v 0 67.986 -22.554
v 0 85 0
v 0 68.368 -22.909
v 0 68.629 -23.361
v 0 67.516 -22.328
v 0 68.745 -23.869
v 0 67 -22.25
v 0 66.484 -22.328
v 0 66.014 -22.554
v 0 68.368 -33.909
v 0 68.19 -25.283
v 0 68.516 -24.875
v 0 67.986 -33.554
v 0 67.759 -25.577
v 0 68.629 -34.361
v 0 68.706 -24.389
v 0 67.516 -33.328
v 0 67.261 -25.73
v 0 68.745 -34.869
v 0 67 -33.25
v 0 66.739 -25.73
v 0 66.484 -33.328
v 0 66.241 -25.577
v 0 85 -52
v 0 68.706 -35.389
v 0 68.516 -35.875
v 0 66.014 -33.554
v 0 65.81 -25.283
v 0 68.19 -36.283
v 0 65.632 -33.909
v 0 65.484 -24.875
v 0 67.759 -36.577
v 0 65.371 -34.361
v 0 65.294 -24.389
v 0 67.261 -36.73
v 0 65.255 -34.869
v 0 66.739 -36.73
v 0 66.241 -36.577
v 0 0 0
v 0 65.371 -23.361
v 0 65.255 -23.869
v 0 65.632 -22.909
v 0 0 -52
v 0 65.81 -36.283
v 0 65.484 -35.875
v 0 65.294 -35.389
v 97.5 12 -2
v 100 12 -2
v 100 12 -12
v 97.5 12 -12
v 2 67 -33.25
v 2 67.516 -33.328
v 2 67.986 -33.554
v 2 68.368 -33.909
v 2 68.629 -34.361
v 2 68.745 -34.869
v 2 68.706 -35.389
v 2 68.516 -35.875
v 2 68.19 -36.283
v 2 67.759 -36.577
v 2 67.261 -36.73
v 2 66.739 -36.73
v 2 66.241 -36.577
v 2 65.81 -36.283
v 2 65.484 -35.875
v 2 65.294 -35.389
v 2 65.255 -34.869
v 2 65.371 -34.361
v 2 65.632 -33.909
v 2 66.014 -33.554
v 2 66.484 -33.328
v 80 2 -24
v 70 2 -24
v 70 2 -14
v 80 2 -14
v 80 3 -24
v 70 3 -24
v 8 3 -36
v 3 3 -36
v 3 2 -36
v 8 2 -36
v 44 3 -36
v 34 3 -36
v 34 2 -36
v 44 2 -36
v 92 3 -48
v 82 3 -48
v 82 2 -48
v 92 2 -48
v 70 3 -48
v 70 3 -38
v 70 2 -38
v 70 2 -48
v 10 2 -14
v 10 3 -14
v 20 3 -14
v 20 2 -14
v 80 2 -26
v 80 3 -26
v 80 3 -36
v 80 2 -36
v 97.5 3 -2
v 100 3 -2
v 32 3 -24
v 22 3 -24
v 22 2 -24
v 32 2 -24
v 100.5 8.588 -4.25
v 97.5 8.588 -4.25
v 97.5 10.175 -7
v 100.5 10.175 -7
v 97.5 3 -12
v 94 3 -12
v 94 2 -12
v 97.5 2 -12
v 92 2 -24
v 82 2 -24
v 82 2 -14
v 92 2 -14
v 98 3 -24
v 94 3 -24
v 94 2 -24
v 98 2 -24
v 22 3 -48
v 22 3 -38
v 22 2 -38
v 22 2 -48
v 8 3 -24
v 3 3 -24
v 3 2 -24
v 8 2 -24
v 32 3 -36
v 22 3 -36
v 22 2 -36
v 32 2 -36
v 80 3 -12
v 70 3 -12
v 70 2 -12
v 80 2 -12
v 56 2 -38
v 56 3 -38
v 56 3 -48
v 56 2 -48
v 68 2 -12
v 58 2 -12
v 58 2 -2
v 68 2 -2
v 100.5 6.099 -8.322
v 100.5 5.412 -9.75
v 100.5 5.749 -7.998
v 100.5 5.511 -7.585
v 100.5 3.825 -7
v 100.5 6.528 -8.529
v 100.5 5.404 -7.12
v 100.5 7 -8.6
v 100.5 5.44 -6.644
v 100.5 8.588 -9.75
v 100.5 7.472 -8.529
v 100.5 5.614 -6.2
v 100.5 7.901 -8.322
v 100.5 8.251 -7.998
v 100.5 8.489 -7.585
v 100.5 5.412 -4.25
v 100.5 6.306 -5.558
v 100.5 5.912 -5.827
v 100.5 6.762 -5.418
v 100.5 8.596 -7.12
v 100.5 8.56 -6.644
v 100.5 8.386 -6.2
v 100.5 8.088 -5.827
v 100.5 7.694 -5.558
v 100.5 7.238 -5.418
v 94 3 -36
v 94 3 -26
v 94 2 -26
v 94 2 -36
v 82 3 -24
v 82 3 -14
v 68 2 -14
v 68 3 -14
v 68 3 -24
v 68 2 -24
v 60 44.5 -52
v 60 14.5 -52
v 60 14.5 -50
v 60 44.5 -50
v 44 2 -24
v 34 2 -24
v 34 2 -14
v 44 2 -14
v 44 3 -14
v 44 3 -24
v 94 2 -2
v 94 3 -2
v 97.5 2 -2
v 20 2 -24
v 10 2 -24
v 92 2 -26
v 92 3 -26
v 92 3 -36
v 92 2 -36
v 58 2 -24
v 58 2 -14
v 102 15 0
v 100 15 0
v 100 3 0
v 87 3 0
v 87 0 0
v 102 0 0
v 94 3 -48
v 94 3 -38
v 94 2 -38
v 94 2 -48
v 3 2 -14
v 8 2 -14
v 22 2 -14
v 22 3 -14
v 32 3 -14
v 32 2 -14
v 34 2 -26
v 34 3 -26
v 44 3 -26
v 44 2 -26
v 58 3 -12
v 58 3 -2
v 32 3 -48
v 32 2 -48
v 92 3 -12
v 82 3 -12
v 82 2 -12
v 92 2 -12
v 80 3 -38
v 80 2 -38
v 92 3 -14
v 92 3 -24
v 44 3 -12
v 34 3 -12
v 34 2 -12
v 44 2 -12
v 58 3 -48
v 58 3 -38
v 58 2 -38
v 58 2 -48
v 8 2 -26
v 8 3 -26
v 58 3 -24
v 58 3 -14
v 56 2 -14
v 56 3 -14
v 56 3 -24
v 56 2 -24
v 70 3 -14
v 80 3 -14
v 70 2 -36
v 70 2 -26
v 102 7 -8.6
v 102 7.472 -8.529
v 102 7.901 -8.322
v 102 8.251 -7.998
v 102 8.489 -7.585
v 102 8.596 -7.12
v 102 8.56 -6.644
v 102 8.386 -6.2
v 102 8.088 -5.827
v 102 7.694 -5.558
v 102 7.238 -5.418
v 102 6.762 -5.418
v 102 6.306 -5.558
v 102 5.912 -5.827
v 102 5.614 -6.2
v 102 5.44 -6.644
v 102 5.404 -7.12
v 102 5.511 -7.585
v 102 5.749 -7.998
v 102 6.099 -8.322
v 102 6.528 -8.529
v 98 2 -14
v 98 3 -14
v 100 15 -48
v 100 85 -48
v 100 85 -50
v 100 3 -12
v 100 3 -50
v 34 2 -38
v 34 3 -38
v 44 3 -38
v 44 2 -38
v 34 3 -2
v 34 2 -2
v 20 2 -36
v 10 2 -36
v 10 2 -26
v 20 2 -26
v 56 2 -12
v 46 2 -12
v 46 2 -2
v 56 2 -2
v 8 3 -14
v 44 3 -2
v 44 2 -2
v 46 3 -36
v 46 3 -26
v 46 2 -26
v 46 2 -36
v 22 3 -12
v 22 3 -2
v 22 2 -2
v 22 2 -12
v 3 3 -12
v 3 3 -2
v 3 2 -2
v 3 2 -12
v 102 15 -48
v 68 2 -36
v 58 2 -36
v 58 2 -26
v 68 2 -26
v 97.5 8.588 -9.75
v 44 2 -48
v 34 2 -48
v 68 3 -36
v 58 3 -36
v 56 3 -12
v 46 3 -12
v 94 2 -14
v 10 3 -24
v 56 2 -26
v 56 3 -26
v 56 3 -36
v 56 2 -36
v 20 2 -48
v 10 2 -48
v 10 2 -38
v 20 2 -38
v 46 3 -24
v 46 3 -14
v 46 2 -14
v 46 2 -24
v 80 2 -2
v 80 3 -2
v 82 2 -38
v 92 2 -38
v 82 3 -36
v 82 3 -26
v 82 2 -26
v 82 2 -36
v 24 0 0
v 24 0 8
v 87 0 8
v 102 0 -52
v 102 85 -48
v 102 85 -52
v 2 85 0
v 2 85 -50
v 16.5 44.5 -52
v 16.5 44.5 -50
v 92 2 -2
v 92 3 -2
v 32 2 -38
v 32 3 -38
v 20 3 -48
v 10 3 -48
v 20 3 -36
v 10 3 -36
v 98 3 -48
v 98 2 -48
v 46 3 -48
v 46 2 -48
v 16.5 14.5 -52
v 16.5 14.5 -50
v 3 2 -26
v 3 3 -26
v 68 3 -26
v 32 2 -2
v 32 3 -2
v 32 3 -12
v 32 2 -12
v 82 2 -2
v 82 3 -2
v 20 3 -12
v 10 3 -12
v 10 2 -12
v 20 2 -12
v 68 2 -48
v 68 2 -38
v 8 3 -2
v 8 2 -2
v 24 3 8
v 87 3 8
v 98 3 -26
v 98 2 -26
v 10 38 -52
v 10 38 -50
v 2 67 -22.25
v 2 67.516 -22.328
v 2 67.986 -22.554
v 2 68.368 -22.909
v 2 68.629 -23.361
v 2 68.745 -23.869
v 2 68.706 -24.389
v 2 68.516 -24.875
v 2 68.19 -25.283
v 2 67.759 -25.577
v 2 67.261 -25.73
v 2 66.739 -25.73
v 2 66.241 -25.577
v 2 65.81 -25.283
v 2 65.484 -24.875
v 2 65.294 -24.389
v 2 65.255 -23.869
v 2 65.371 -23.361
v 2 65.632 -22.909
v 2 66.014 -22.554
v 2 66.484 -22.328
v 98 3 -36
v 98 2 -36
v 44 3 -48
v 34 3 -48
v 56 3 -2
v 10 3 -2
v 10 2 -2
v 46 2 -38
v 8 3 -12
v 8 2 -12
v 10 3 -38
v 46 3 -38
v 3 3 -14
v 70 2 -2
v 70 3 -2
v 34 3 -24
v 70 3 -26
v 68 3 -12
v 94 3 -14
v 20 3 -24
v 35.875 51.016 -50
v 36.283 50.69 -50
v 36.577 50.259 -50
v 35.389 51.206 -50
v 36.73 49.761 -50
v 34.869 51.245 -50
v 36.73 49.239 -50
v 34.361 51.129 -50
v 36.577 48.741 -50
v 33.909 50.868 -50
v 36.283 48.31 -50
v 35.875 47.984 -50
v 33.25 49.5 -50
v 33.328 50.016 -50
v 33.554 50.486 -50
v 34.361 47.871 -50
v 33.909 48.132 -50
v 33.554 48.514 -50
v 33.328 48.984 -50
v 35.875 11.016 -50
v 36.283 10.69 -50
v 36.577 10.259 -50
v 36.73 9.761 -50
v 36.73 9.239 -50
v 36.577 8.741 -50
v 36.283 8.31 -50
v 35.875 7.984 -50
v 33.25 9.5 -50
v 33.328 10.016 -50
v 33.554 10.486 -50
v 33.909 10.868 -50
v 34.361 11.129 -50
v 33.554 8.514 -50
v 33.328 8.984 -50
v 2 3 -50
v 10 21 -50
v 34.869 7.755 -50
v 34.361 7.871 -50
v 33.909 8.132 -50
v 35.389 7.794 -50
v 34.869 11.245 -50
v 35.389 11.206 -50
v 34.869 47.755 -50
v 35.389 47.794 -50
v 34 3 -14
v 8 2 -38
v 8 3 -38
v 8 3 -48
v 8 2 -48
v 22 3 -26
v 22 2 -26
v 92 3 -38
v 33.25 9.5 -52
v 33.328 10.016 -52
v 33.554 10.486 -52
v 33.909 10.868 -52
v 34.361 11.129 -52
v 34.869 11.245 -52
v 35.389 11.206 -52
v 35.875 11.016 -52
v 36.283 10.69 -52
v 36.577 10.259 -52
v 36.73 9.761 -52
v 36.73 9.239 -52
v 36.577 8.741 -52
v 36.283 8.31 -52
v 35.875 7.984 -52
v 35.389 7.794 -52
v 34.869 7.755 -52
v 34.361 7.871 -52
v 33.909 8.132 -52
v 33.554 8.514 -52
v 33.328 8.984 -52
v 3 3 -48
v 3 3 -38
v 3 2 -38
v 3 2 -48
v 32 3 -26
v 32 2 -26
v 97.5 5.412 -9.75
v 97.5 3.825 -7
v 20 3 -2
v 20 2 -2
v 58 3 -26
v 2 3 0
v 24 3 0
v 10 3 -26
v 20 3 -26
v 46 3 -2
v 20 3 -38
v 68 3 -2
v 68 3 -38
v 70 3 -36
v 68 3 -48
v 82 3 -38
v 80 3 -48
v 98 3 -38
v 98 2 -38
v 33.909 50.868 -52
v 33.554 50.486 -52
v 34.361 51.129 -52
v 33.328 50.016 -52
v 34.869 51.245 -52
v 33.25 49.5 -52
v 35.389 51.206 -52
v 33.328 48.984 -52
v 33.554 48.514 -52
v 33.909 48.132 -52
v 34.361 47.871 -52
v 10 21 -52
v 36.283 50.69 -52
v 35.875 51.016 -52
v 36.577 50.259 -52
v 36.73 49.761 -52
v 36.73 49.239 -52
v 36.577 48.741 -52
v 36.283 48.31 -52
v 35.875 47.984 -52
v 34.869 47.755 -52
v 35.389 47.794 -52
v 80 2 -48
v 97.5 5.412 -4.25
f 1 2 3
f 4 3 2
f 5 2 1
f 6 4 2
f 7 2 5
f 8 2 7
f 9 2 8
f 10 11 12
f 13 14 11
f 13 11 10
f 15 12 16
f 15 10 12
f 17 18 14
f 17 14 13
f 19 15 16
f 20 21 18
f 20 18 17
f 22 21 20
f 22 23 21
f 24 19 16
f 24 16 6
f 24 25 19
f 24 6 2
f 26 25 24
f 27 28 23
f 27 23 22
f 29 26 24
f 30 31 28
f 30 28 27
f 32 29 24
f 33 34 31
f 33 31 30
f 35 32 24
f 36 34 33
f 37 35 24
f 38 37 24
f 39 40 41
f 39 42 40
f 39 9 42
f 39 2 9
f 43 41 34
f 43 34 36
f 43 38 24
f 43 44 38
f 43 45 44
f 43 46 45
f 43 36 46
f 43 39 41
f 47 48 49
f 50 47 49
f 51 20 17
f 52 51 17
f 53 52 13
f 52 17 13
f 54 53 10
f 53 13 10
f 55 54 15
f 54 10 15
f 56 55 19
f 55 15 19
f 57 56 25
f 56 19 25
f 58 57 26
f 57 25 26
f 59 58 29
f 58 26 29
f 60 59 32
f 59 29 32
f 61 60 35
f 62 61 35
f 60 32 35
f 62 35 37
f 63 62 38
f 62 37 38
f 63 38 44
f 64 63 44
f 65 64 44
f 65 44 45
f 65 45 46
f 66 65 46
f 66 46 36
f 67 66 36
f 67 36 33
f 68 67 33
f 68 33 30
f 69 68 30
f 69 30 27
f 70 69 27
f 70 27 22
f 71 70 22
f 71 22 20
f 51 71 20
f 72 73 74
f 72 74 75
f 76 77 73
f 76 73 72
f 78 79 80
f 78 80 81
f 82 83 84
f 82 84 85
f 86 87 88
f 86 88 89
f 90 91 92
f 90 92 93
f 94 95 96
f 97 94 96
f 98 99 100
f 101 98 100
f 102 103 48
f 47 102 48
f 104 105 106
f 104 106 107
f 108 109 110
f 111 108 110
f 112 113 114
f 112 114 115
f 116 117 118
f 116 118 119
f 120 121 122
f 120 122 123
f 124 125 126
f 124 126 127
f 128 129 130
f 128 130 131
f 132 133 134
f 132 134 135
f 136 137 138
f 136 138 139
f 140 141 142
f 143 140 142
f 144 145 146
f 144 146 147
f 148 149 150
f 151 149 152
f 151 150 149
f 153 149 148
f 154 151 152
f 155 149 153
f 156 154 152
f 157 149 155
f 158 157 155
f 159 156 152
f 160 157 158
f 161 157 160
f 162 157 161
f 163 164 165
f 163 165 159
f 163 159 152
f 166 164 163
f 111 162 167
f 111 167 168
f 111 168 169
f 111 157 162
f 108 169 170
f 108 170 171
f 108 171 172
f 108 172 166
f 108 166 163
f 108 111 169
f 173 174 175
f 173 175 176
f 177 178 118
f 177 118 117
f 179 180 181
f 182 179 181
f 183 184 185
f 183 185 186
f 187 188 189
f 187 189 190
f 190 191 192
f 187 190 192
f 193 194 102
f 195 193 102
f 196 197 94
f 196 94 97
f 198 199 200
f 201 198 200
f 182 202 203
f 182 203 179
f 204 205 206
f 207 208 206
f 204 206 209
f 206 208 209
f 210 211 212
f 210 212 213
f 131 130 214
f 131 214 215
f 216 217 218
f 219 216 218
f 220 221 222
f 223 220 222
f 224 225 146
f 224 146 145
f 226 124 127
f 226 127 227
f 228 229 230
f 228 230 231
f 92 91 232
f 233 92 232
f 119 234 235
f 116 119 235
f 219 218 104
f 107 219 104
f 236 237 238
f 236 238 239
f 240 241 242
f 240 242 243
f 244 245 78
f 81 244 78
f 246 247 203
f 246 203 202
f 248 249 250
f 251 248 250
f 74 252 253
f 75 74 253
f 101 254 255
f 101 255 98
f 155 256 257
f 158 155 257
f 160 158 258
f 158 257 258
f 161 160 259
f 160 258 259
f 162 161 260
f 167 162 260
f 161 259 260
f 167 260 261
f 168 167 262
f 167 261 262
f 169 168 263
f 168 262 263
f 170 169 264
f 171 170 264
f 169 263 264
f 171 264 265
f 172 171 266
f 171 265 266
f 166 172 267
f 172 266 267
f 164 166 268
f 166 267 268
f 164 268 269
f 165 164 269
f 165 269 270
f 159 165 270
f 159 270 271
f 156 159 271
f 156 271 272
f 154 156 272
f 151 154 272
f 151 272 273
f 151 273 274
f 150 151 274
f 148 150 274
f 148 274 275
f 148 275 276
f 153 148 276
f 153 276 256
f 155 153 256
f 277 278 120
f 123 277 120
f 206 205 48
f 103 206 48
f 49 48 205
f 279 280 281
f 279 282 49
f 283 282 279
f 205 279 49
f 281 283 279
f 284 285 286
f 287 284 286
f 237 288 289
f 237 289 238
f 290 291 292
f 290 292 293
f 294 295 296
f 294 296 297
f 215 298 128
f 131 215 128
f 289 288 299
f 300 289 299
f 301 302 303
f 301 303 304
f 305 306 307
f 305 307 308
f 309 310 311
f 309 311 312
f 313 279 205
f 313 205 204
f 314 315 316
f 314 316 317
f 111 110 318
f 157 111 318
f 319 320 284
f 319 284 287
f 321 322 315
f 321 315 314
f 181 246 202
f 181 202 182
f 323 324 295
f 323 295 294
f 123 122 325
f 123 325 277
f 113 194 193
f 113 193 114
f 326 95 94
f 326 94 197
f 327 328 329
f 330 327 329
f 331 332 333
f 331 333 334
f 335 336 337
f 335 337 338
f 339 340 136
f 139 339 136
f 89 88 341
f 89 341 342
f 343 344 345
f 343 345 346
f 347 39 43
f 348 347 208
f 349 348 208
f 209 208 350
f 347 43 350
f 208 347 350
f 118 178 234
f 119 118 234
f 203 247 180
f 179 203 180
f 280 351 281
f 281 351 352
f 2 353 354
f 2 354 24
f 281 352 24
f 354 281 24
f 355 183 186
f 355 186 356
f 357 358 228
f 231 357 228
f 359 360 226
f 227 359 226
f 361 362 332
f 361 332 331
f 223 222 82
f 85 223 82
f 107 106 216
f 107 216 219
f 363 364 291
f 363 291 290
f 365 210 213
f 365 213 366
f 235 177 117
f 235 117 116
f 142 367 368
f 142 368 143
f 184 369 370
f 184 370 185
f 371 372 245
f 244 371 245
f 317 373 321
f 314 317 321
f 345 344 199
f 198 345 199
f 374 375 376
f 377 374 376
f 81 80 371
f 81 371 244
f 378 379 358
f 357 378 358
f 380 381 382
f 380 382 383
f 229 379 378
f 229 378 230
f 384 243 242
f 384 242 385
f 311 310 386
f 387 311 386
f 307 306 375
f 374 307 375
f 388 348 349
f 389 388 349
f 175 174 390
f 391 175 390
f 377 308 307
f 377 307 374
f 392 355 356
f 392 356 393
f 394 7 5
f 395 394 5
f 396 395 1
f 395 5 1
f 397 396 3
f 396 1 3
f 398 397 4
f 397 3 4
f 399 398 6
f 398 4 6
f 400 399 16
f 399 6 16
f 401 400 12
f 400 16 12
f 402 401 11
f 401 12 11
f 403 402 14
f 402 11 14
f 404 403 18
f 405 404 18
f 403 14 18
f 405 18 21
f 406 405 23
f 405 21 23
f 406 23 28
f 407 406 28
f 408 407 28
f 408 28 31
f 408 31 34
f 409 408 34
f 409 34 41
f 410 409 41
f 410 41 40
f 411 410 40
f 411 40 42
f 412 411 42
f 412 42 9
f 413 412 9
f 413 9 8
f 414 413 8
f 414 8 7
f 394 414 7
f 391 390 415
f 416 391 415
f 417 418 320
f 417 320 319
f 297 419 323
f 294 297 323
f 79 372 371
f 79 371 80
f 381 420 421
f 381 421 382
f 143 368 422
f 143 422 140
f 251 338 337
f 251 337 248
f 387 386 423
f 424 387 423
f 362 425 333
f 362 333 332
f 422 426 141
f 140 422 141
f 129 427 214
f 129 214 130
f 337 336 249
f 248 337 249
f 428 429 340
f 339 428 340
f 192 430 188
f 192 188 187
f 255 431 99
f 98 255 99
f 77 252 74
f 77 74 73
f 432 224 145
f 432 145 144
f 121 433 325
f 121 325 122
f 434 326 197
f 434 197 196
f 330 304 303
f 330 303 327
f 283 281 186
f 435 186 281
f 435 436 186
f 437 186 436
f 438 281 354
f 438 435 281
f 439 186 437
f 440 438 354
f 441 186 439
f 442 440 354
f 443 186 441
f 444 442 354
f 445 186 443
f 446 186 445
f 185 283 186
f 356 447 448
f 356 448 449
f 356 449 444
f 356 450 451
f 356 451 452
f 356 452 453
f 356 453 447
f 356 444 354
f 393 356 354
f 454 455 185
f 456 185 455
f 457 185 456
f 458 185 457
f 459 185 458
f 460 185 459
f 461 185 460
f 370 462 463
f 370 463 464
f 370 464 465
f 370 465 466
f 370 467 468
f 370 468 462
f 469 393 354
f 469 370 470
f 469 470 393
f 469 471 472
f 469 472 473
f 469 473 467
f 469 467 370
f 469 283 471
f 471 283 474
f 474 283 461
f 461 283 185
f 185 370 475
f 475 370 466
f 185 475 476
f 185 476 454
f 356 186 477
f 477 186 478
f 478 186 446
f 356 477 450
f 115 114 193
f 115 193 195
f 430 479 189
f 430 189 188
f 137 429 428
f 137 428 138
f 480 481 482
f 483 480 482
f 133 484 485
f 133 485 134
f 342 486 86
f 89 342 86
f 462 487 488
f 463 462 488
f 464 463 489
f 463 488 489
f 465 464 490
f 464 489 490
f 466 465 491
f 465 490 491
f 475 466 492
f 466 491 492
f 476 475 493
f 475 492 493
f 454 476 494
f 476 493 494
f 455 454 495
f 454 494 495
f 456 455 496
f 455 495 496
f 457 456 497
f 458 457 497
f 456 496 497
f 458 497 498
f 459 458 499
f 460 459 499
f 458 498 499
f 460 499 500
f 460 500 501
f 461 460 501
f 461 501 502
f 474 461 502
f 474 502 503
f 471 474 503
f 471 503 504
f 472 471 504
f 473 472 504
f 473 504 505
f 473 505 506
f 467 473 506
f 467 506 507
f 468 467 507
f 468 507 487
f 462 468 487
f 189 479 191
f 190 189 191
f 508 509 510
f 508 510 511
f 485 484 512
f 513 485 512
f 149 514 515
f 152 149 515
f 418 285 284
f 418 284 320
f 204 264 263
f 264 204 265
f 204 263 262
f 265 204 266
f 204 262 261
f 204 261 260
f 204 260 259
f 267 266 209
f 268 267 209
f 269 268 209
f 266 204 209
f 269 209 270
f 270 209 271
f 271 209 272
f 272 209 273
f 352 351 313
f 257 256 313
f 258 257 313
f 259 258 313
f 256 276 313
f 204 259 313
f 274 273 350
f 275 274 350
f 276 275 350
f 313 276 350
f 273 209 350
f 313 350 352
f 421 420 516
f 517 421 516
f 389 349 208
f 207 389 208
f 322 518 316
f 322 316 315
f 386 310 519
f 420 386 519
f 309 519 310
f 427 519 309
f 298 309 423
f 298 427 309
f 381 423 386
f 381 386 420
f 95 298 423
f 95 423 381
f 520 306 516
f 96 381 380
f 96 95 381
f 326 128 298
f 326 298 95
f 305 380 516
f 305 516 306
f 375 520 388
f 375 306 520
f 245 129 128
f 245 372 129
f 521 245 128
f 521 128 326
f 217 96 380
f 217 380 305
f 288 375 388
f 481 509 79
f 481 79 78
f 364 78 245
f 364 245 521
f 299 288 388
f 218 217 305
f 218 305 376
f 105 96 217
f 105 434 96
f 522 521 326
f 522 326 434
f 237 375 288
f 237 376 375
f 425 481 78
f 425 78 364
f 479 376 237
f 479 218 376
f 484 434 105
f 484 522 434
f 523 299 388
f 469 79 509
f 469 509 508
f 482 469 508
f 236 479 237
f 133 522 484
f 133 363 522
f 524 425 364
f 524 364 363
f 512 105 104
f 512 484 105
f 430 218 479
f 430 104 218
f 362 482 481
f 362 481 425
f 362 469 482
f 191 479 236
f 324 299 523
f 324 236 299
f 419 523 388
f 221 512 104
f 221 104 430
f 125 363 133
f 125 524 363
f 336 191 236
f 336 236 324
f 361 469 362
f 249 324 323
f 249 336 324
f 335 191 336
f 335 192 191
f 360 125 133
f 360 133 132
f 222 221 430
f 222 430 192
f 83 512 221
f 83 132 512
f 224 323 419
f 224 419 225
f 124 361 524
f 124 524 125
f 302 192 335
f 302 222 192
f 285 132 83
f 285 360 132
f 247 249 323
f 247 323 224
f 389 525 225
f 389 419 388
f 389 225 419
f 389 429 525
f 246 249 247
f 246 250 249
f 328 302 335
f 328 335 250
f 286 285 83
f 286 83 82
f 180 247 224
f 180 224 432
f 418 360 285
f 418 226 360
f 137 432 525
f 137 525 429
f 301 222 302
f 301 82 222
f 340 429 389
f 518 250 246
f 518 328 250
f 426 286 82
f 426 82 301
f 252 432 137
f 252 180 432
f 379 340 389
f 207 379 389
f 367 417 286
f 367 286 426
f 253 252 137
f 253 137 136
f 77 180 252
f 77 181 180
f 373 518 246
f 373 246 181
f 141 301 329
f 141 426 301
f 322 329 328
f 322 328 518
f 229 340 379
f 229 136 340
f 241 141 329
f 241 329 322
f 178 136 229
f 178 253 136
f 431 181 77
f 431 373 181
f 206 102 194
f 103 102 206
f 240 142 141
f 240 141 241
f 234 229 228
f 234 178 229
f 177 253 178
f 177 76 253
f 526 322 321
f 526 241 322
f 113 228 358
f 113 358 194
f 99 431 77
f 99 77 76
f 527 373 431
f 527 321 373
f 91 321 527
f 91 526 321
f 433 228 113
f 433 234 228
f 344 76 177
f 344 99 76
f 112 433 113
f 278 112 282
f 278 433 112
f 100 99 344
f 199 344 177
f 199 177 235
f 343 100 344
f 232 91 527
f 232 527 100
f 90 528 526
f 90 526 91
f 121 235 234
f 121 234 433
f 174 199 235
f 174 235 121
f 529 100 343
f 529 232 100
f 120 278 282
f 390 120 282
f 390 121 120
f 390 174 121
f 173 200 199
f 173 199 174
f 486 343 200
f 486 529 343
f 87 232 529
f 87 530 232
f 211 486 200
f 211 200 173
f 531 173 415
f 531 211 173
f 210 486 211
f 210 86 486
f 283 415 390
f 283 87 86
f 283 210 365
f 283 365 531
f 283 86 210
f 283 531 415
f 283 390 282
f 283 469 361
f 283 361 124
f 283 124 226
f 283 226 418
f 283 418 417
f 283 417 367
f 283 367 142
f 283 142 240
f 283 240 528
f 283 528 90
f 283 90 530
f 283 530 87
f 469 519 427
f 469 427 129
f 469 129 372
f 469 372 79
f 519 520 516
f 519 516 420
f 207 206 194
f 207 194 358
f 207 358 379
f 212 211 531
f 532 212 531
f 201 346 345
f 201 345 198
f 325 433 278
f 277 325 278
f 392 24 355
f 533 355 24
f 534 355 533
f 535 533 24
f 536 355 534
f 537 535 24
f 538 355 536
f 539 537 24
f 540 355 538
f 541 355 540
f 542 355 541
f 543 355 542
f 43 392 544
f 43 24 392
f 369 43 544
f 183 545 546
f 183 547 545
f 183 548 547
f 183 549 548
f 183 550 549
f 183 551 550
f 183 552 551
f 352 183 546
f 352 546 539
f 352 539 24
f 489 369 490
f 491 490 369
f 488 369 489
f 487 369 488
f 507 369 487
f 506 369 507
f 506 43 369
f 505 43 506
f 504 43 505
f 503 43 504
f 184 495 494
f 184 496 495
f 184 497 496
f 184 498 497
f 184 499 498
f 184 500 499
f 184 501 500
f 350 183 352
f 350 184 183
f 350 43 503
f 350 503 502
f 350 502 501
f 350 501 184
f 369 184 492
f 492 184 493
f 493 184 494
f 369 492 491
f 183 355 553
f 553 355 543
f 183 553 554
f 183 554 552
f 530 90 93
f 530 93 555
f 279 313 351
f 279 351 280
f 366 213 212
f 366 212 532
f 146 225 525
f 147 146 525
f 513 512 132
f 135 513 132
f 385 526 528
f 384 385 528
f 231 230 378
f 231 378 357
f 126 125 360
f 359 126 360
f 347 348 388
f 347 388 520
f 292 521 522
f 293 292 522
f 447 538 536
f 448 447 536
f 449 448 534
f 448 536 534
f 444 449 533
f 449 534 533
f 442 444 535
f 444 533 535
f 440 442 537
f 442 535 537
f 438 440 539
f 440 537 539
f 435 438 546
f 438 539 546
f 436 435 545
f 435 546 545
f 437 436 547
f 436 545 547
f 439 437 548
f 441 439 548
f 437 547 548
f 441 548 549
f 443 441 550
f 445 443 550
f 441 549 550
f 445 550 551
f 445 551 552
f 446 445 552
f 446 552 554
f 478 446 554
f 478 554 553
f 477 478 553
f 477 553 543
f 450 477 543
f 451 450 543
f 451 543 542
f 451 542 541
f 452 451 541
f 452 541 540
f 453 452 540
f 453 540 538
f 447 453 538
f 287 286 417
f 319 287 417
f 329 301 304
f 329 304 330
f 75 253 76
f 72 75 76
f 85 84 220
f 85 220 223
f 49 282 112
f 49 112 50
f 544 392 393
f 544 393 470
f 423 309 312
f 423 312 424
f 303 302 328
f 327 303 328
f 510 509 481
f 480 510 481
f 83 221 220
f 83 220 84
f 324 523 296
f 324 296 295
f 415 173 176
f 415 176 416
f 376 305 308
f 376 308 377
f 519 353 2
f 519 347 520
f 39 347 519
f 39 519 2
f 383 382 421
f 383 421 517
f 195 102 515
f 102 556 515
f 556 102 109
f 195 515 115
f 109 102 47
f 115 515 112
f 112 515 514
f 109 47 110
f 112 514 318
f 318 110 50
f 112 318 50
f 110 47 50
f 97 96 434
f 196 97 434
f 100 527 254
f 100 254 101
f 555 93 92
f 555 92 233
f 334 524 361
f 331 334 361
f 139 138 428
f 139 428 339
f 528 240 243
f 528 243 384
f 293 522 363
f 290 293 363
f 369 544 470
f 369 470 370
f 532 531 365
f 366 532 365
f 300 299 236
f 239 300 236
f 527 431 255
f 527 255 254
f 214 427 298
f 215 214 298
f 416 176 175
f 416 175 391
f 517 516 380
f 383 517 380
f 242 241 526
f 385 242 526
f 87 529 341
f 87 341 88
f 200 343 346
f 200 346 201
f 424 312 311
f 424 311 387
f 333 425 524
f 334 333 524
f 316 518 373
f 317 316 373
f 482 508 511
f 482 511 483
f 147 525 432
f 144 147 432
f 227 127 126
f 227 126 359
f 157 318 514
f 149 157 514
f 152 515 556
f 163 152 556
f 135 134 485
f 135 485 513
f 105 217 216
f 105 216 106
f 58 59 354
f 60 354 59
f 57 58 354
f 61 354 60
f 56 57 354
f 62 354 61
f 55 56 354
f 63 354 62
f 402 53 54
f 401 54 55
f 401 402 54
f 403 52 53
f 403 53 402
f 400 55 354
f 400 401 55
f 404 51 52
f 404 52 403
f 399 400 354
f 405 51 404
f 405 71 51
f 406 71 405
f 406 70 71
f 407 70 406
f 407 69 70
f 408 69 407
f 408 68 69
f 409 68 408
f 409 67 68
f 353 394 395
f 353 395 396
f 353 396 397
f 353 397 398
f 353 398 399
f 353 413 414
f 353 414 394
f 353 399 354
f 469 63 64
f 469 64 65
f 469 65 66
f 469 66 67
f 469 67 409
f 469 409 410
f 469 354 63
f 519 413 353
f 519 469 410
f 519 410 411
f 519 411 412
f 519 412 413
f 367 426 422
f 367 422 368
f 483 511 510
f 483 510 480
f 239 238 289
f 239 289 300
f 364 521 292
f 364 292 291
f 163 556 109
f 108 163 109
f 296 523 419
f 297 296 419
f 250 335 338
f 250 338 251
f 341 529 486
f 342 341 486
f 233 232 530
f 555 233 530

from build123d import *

# Parameters (mm, degrees)
SKETCH1_W           = 102
SKETCH1_H           = 52
SKETCH1_W_2         = 63
SKETCH1_H_2         = 8
BOSS_EXTRUDE1_DEPTH = 3
BOSS_EXTRUDE2_DEPTH = 82
SKETCH3_W           = 2
SKETCH3_H           = 48
BOSS_EXTRUDE3_DEPTH = 12
CUT_EXTRUDE1_REACH  = 144.594
SKETCH4_R           = 1.6
SKETCH5_W           = 10
SKETCH5_H           = 10
SKETCH5_W_2         = 5
SKETCH5_W_3         = 4
CUT_EXTRUDE2_DEPTH  = 1
SKETCH6_W           = 10
SKETCH6_H           = 10
SKETCH6_R           = 1.6
BOSS_EXTRUDE4_DEPTH = 4.5
CUT_EXTRUDE3_DEPTH  = 3
SKETCH8_R           = 1.75
CUT_EXTRUDE4_DEPTH  = 3
SKETCH9_R           = 1.75
CUT_EXTRUDE5_DEPTH  = 3


with BuildPart() as part:
    # Sketch1 → Boss-Extrude1 (new body)
    with BuildSketch(Plane(origin=(0, 0, 0), x_dir=(1, 0, 0), z_dir=(0, 1, 0))):
        with Locations((51, 26)):
            Rectangle(SKETCH1_W, SKETCH1_H)
        with Locations((55.5, -4)):
            Rectangle(SKETCH1_W_2, SKETCH1_H_2)
    extrude(amount=BOSS_EXTRUDE1_DEPTH)

    # Sketch2 → Boss-Extrude2 (add)
    with BuildSketch(Plane(origin=(0, 3, 0), x_dir=(1, 0, 0), z_dir=(0, 1, 0))):
        Polygon((0, 0), (0, 52), (102, 52), (102, 48), (100, 48), (100, 50), (2, 50), (2, 0), align=None)
    extrude(amount=BOSS_EXTRUDE2_DEPTH)

    # Sketch3 → Boss-Extrude3 (add)
    with BuildSketch(Plane(origin=(0, 3, 0), x_dir=(1, 0, 0), z_dir=(0, 1, 0))):
        with Locations((101, 24)):
            Rectangle(SKETCH3_W, SKETCH3_H)
    extrude(amount=BOSS_EXTRUDE3_DEPTH)

    # Sketch4 → Cut-Extrude1 (cut, up to next)
    with BuildSketch(Plane(origin=(102, 0, 0), x_dir=(0, 0, -1), z_dir=(1, 0, 0)), mode=Mode.PRIVATE) as cut_extrude1_sk1:
        with Locations((7, 7)):
            Circle(SKETCH4_R)
    cut_extrude1_tool1 = extrude(cut_extrude1_sk1.sketch, amount=-CUT_EXTRUDE1_REACH, mode=Mode.PRIVATE) & part.part
    add(cut_extrude1_tool1.solids().sort_by_distance((102, 7, -7))[0], mode=Mode.SUBTRACT)

    # Sketch5 → Cut-Extrude2 (cut)
    with BuildSketch(Plane(origin=(0, 3, 0), x_dir=(1, 0, 0), z_dir=(0, 1, 0))):
        with Locations((87, 7)):
            Rectangle(SKETCH5_W, SKETCH5_H)
        with Locations((75, 7)):
            Rectangle(SKETCH5_W, SKETCH5_H)
        with Locations((63, 7)):
            Rectangle(SKETCH5_W, SKETCH5_H)
        with Locations((51, 7)):
            Rectangle(SKETCH5_W, SKETCH5_H)
        with Locations((39, 7)):
            Rectangle(SKETCH5_W, SKETCH5_H)
        with Locations((27, 7)):
            Rectangle(SKETCH5_W, SKETCH5_H)
        with Locations((15, 7)):
            Rectangle(SKETCH5_W, SKETCH5_H)
        with Locations((75, 19)):
            Rectangle(SKETCH5_W, SKETCH5_H)
        with Locations((63, 19)):
            Rectangle(SKETCH5_W, SKETCH5_H)
        with Locations((51, 19)):
            Rectangle(SKETCH5_W, SKETCH5_H)
        with Locations((39, 19)):
            Rectangle(SKETCH5_W, SKETCH5_H)
        with Locations((27, 19)):
            Rectangle(SKETCH5_W, SKETCH5_H)
        with Locations((15, 19)):
            Rectangle(SKETCH5_W, SKETCH5_H)
        with Locations((75, 31)):
            Rectangle(SKETCH5_W, SKETCH5_H)
        with Locations((63, 31)):
            Rectangle(SKETCH5_W, SKETCH5_H)
        with Locations((51, 31)):
            Rectangle(SKETCH5_W, SKETCH5_H)
        with Locations((39, 31)):
            Rectangle(SKETCH5_W, SKETCH5_H)
        with Locations((27, 31)):
            Rectangle(SKETCH5_W, SKETCH5_H)
        with Locations((15, 31)):
            Rectangle(SKETCH5_W, SKETCH5_H)
        with Locations((75, 43)):
            Rectangle(SKETCH5_W, SKETCH5_H)
        with Locations((63, 43)):
            Rectangle(SKETCH5_W, SKETCH5_H)
        with Locations((51, 43)):
            Rectangle(SKETCH5_W, SKETCH5_H)
        with Locations((39, 43)):
            Rectangle(SKETCH5_W, SKETCH5_H)
        with Locations((27, 43)):
            Rectangle(SKETCH5_W, SKETCH5_H)
        with Locations((15, 43)):
            Rectangle(SKETCH5_W, SKETCH5_H)
        with Locations((87, 19)):
            Rectangle(SKETCH5_W, SKETCH5_H)
        with Locations((87, 31)):
            Rectangle(SKETCH5_W, SKETCH5_H)
        with Locations((87, 43)):
            Rectangle(SKETCH5_W, SKETCH5_H)
        with Locations((5.5, 7)):
            Rectangle(SKETCH5_W_2, SKETCH5_H)
        with Locations((5.5, 19)):
            Rectangle(SKETCH5_W_2, SKETCH5_H)
        with Locations((5.5, 31)):
            Rectangle(SKETCH5_W_2, SKETCH5_H)
        with Locations((5.5, 43)):
            Rectangle(SKETCH5_W_2, SKETCH5_H)
        with Locations((96, 43)):
            Rectangle(SKETCH5_W_3, SKETCH5_H)
        with Locations((96, 31)):
            Rectangle(SKETCH5_W_3, SKETCH5_H)
        with Locations((96, 19)):
            Rectangle(SKETCH5_W_3, SKETCH5_H)
        with Locations((96, 7)):
            Rectangle(SKETCH5_W_3, SKETCH5_H)
    extrude(amount=-CUT_EXTRUDE2_DEPTH, mode=Mode.SUBTRACT)

    # Sketch6 → Boss-Extrude4 (add)
    with BuildSketch(Plane(origin=(102, 0, 0), x_dir=(0, 0, -1), z_dir=(1, 0, 0))):
        with Locations((7, 7)):
            Rectangle(SKETCH6_W, SKETCH6_H)
        with Locations((7, 7)):
            Circle(SKETCH6_R, mode=Mode.SUBTRACT)
    extrude(amount=-BOSS_EXTRUDE4_DEPTH)

    # Sketch7 → Cut-Extrude3 (cut)
    with BuildSketch(Plane.ZY.offset(-97.5)):
        Polygon((-4.250369343, 8.5875), (-7, 10.175), (-9.749630657, 8.5875), (-9.749630657, 5.4125), (-7, 3.825), (-4.250369343, 5.4125), align=None)
    extrude(amount=-CUT_EXTRUDE3_DEPTH, mode=Mode.SUBTRACT)

    # Sketch8 → Cut-Extrude4 (cut)
    with BuildSketch(Plane(origin=(0, 0, -52), x_dir=(-1, 0, 0), z_dir=(0, 0, -1))):
        with Locations((-35, 49.5)):
            Circle(SKETCH8_R)
        with Locations((-35, 9.5)):
            Circle(SKETCH8_R)
        Polygon((-16.5, 14.5), (-60, 14.5), (-60, 44.5), (-16.5, 44.5), (-10, 38), (-10, 21), align=None)
    extrude(amount=-CUT_EXTRUDE4_DEPTH, mode=Mode.SUBTRACT)

    # Sketch9 → Cut-Extrude5 (cut)
    with BuildSketch(Plane.ZY):
        with Locations((-24, 67)):
            Circle(SKETCH9_R)
        with Locations((-35, 67)):
            Circle(SKETCH9_R)
    extrude(amount=-CUT_EXTRUDE5_DEPTH, mode=Mode.SUBTRACT)


solid = part.part
